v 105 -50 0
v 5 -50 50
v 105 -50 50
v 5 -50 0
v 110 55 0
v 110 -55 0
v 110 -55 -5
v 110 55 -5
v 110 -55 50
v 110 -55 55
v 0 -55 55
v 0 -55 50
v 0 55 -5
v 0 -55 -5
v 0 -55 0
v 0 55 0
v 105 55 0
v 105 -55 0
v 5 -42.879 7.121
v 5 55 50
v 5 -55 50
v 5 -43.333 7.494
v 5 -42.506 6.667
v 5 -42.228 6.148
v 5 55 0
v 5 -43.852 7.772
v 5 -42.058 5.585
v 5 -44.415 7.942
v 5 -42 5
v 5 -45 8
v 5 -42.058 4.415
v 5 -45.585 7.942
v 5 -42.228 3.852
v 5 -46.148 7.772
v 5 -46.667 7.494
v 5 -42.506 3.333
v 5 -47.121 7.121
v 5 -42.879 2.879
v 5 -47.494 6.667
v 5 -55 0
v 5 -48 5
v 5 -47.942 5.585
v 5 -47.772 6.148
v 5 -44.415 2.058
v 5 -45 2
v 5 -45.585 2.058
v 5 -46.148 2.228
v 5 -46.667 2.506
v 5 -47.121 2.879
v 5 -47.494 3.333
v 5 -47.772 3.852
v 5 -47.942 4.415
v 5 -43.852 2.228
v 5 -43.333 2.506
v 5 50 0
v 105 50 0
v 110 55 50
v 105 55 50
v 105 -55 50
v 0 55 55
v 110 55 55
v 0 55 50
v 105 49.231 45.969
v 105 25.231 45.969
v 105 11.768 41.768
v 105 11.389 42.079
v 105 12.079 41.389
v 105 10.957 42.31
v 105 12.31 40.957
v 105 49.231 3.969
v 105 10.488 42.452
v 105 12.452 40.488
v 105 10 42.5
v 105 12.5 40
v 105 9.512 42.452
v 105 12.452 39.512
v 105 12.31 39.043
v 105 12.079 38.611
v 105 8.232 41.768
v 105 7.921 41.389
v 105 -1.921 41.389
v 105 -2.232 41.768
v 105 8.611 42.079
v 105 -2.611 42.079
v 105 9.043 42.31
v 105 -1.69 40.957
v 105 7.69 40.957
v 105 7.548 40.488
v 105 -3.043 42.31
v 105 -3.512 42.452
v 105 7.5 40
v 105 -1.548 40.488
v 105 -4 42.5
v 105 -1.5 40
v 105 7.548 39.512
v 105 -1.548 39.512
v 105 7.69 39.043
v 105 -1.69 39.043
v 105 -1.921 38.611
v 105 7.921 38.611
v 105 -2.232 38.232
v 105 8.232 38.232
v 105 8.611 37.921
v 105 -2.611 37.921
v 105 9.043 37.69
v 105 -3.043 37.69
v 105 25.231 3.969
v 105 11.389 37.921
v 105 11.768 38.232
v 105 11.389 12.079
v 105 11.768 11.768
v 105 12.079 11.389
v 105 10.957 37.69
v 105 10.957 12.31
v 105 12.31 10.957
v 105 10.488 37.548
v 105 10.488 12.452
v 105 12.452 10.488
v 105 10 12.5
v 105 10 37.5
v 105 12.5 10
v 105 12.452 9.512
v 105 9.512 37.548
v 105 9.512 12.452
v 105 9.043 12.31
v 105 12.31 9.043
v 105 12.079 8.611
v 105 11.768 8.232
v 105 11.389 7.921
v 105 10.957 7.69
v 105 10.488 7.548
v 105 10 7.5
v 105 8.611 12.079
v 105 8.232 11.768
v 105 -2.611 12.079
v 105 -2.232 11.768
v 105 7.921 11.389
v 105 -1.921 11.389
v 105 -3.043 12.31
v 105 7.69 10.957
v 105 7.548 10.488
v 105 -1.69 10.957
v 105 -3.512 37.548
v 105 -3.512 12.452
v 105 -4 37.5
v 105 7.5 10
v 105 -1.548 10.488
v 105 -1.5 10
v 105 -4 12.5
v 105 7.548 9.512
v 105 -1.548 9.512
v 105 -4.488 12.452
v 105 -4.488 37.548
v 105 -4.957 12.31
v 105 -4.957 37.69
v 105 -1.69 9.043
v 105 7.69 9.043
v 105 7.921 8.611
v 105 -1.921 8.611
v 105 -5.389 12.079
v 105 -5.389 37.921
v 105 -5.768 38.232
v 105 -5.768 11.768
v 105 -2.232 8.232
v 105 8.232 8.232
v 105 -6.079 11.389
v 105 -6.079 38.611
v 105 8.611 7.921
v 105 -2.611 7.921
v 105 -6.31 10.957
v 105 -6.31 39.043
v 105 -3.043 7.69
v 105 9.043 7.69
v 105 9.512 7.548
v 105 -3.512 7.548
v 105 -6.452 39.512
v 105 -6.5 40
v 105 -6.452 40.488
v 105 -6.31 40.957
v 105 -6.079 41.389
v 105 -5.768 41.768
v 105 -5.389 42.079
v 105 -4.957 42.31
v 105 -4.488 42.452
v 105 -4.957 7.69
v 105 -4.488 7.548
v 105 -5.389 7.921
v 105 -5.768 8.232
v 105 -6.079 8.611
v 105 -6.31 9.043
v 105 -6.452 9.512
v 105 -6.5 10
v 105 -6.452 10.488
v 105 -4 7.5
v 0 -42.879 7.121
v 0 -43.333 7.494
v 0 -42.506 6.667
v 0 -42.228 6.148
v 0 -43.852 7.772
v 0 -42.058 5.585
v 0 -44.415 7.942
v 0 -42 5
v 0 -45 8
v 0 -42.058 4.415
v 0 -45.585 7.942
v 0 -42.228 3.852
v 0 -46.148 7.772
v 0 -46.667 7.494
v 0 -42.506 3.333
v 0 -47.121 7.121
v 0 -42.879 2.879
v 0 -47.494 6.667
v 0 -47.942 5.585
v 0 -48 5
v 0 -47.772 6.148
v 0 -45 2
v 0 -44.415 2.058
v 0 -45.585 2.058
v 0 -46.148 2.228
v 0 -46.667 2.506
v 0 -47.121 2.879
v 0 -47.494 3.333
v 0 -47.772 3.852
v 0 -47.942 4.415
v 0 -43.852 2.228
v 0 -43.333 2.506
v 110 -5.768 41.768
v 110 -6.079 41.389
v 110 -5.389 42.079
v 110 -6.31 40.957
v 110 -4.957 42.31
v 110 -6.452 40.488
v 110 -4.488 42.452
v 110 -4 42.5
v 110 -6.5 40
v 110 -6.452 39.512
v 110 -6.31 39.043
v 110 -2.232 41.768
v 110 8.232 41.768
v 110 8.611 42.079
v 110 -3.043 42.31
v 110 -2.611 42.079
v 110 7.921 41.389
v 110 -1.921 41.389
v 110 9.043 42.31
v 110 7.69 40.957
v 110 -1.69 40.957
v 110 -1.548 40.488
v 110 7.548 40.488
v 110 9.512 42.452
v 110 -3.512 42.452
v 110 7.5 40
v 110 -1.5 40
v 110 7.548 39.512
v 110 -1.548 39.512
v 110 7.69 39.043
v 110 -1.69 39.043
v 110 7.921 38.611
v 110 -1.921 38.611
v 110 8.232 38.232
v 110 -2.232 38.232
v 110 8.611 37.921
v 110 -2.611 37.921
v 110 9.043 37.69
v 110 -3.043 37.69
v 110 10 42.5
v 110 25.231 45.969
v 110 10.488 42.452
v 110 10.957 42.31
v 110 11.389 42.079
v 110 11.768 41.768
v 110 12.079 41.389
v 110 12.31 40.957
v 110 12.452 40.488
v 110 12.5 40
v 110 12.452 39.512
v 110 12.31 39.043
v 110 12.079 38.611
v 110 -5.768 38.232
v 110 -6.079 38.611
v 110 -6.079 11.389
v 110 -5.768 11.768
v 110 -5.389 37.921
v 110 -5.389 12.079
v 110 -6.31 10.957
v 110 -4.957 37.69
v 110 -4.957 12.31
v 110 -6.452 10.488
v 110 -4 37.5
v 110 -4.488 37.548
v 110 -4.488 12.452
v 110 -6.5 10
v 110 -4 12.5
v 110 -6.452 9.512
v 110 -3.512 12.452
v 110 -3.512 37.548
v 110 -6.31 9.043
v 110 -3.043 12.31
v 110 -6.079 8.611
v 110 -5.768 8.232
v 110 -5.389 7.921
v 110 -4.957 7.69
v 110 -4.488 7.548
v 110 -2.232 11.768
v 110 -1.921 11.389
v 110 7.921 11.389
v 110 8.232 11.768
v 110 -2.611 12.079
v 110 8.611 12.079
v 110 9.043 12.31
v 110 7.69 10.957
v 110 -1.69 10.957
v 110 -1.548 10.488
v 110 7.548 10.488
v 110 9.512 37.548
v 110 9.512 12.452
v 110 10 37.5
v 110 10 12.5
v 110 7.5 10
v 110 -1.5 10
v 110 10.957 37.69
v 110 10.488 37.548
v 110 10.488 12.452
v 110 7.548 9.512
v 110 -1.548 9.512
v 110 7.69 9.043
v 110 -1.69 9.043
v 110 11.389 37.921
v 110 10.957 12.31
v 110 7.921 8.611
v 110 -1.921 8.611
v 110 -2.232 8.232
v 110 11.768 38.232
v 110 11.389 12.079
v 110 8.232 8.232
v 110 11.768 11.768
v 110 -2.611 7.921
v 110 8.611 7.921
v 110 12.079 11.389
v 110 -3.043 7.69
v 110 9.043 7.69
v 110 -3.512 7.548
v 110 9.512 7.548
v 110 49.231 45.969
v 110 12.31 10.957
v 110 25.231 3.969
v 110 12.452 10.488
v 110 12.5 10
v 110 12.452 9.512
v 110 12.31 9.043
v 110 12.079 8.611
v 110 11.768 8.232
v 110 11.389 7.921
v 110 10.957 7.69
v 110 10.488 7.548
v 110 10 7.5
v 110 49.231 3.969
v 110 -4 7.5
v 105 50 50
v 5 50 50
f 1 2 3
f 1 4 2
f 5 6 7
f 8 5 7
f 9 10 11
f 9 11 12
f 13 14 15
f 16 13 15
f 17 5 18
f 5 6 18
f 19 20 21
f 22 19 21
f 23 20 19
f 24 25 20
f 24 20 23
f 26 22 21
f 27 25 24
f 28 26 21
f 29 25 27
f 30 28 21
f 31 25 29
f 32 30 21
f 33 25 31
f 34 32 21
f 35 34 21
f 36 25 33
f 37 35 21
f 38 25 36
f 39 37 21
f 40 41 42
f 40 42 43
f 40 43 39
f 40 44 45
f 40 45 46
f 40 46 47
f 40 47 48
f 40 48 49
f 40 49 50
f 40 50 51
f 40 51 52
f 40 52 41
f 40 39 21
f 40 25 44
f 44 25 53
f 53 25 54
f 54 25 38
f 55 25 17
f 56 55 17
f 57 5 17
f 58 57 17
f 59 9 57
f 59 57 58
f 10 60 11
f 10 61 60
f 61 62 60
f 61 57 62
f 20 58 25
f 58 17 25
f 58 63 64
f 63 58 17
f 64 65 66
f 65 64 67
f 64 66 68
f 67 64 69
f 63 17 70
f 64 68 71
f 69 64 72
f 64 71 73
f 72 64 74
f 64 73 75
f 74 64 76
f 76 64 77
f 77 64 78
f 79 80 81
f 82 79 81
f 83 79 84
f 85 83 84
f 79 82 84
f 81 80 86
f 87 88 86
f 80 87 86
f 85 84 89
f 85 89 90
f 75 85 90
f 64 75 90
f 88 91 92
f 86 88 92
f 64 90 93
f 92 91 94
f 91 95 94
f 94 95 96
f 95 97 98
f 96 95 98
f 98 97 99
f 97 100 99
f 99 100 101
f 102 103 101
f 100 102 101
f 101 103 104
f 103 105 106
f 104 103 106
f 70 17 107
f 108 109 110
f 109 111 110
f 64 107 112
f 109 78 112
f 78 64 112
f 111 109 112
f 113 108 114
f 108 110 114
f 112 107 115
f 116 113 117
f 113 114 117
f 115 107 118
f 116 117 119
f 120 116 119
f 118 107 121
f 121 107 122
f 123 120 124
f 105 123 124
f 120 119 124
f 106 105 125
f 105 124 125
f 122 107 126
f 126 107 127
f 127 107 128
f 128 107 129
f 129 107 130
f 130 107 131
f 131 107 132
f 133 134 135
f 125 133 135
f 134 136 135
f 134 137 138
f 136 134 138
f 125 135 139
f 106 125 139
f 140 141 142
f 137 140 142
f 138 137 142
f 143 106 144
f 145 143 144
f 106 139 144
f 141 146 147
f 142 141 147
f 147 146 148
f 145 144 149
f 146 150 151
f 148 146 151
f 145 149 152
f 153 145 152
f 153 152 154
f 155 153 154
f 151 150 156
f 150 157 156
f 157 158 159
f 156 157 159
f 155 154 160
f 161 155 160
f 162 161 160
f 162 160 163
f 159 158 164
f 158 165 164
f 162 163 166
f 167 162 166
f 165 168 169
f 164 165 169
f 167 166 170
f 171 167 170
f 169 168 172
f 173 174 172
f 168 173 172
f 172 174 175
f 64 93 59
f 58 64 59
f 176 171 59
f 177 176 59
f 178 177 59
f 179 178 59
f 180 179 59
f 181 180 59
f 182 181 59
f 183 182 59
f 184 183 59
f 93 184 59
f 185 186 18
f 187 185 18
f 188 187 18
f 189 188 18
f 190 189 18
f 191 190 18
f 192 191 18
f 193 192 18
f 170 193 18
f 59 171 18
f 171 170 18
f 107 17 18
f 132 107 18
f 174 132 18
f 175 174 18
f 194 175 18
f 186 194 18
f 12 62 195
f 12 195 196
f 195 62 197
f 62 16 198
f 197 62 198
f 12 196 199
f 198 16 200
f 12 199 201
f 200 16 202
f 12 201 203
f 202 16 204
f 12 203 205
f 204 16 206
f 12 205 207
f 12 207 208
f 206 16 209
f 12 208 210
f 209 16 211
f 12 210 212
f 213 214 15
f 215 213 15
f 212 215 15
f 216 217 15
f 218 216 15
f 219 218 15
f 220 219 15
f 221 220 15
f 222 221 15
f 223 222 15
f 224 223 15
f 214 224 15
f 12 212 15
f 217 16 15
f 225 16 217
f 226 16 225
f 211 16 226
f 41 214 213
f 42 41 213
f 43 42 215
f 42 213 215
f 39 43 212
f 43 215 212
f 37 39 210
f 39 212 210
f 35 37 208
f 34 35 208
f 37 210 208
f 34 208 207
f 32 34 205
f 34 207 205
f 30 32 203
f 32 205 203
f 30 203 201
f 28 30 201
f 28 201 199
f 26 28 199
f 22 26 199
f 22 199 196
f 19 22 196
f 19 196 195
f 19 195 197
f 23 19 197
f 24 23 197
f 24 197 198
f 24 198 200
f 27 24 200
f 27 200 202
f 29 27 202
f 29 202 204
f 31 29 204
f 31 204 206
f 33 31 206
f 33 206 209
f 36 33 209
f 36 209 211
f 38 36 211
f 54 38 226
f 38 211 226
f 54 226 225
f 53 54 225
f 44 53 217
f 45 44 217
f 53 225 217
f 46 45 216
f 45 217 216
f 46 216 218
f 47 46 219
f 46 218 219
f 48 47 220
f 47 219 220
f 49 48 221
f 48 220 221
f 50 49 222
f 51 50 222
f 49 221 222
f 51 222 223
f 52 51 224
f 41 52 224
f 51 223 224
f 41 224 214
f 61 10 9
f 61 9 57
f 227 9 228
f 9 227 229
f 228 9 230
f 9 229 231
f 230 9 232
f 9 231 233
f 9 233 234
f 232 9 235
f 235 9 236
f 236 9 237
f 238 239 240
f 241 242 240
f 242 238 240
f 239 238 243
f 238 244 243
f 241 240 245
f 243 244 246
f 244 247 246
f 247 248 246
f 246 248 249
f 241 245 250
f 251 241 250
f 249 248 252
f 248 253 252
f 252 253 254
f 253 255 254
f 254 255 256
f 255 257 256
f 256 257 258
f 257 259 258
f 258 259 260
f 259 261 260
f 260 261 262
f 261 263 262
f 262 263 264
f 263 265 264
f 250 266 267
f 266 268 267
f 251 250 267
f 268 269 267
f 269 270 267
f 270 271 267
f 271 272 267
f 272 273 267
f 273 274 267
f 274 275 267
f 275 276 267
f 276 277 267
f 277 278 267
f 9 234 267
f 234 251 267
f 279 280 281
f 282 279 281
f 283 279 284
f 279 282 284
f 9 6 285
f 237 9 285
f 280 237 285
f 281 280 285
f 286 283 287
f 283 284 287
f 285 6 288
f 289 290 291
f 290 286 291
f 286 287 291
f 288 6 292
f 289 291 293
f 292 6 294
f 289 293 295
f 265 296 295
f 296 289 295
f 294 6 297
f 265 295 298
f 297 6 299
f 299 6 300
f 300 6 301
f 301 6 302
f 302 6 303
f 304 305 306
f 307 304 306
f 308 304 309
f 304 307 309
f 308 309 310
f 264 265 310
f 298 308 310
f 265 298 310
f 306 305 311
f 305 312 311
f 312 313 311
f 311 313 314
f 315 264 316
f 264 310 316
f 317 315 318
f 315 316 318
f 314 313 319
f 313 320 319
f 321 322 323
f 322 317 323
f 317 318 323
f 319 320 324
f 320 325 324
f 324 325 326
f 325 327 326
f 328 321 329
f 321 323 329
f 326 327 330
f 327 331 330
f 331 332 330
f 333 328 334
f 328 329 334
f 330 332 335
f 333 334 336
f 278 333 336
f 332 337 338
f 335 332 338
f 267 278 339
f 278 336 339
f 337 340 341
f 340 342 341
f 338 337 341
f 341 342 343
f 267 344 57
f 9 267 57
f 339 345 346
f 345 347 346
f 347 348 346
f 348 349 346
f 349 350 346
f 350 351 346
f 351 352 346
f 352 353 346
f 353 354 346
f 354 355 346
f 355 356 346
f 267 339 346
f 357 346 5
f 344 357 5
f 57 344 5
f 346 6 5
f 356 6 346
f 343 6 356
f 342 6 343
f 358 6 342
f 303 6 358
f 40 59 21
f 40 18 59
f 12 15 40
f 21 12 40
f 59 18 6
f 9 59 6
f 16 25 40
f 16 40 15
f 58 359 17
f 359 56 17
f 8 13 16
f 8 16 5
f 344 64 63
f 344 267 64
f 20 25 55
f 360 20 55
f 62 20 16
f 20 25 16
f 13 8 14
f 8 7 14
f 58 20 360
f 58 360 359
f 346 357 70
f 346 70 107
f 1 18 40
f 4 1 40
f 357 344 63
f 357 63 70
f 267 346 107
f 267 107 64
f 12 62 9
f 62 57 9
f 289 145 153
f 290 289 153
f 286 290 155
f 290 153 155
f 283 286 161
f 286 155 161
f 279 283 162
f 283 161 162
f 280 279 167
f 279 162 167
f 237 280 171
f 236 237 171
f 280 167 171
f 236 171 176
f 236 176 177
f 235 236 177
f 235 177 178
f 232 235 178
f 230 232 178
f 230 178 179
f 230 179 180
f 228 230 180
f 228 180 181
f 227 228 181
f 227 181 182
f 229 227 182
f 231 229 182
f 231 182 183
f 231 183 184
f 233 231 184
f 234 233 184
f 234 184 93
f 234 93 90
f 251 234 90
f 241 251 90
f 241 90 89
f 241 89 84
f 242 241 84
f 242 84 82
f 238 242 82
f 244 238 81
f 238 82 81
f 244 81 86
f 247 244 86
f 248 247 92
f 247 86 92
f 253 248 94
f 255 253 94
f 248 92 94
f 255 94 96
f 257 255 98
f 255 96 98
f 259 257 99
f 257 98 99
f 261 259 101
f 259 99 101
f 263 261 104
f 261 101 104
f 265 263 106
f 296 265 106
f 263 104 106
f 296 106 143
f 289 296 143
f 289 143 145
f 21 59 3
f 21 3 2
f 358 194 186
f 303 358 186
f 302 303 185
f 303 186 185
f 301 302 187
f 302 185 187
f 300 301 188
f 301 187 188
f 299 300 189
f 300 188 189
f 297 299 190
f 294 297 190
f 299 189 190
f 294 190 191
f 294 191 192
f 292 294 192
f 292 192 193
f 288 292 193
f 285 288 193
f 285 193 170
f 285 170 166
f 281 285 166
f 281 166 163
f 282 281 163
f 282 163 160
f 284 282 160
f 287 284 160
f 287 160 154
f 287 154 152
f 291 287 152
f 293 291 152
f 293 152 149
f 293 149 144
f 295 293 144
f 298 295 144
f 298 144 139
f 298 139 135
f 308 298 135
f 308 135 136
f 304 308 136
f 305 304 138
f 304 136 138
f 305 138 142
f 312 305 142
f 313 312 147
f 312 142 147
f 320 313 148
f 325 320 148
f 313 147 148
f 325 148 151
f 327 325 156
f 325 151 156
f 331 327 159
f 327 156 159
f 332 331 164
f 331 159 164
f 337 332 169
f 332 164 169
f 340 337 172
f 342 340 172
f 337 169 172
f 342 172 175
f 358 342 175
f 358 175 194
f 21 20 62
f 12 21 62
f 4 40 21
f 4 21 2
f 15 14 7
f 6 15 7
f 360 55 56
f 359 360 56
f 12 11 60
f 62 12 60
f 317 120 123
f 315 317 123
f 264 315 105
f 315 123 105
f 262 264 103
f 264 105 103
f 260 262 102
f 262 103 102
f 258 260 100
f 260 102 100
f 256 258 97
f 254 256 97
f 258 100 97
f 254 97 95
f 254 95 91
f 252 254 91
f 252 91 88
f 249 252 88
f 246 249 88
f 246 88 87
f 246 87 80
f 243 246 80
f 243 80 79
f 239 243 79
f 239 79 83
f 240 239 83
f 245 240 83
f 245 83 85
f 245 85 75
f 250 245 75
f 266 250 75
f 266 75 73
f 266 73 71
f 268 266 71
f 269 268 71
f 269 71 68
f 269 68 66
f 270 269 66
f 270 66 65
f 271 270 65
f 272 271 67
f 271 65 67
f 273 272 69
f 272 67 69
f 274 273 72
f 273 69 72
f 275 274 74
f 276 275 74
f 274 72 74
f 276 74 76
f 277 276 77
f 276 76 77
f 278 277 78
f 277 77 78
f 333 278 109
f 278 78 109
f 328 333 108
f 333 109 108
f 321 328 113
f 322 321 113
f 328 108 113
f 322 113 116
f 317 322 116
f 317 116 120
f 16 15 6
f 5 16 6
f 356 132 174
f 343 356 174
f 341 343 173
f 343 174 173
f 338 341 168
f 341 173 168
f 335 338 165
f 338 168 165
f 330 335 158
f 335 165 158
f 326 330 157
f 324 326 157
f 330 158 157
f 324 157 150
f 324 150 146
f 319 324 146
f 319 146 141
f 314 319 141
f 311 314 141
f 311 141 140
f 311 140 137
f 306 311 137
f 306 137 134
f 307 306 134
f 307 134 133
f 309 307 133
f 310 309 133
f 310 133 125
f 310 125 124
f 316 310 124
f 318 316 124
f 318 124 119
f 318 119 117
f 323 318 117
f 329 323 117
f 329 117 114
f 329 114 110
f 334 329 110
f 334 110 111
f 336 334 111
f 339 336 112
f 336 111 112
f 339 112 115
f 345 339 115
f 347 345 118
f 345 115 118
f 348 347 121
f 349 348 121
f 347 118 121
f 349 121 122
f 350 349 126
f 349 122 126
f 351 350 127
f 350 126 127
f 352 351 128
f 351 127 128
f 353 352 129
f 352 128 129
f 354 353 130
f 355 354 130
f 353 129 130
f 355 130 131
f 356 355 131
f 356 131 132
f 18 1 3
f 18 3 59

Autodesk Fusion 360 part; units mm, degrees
sketch "Sketch1" plane through (0, 0, 0) normal (0, 1, 0) x (1, 0, 0)
  line L0 (0, 0) -> (110, 0)
  line L1 (110, 0) -> (110, 5)
  line L2 (110, 5) -> (0, 5)
  line L3 (0, 5) -> (0, 0)
  dimension "d1" = 110
extrude "Extrude1" add sketch "Sketch1" along normal mid plane 110 makes body 1
sketch "Sketch2" plane through (0, 0, 0) normal (0, 0, 1) x (-1, 0, 0)
  line L0 (-110, 55) -> (-110, -55)
  line L1 (-110, -55) -> (0, -55)
  line L2 (0, -55) -> (0, 55)
  line L3 (0, 55) -> (-110, 55)
  line L4 (0, -55) -> (-5.0003, -55)
  line L5 (-5.0003, -55) -> (-5.0003, 55)
  line L6 (-5.0003, 55) -> (0, 55)
  line L7 (0, 55) -> (0, -55)
extrude "Extrude2" add sketch "Sketch2" along normal blind 50 separate body contours L1 L2 L3 L4 L5 L6 L7 makes body 2
sketch "Sketch3" plane through (0, 0, 0) normal (0, 0, 1) x (1, 0, 0)
sketch "Sketch4" plane through (0, 0, 0) normal (0, 0, 1) x (-1, 0, 0)
  line L0 (-110, 55) -> (-110, -55)
  line L1 (-110, -55) -> (0, -55)
  line L2 (0, -55) -> (0, 55)
  line L3 (0, 55) -> (-110, 55)
  line L4 (-110, -55) -> (-105, -55)
  line L5 (-105, -55) -> (-105, 55)
  line L6 (-105, 55) -> (-110, 55)
  line L7 (-110, 55) -> (-110, -55)
  dimension "d6" = 5
  dimension "d7" = 110
extrude "Extrude3" add sketch "Sketch4" along normal blind 50 separate body contours L0 L1 L3 L4 L5 L6 L7 makes body 3
sketch "Sketch5" plane through (0, 0, 0) normal (0, 0, 1) x (-1, 0, 0)
  line L0 (-110, 55) -> (-110, -55)
  line L1 (-110, -55) -> (0, -55)
  line L2 (0, -55) -> (0, 55)
  line L3 (0, 55) -> (-110, 55)
sketch "Sketch6" plane through (0, 0, 0) normal (0, 0, 1) x (-1, 0, 0)
  line L0 (-105, 55) -> (-5, 55)
  line L1 (-5, 55) -> (-5, 50)
  line L2 (-5, 50) -> (-105, 50)
  line L3 (-105, 50) -> (-105, 55)
extrude "Extrude4" add sketch "Sketch6" along normal blind 50 separate body makes body 4
sketch "Sketch7" plane through (0, 0, 0) normal (0, 0, 1) x (1, 0, 0)
  line L0 (105, 55) -> (5, 55)
  line L1 (5, 55) -> (5, 50)
  line L2 (5, 50) -> (105, 50)
  line L3 (105, 50) -> (105, 55)
extrude "Extrude5" add sketch "Sketch7" along normal blind 50 separate body makes body 5
sketch "Sketch8" plane through (110, 0, 0) normal (1, 0, 0) x (0, 1, 0)
  line L0 (-55, 0) -> (55, 0)
  line L1 (55, 0) -> (55, 50)
  line L2 (55, 50) -> (-55, 50)
  line L3 (-55, 50) -> (-55, 0)
  line L4 (-55, 50) -> (55, 50)
  line L5 (55, 50) -> (55, 55)
  line L6 (55, 55) -> (-55, 55)
  line L7 (-55, 55) -> (-55, 50)
extrude "Extrude6" add sketch "Sketch8" against normal blind 110 separate body contours L2 L4 L5 L6 L7 makes body 6
sketch "Sketch9" plane through (110, 0, 0) normal (1, 0, 0) x (0, 1, 0)
  line L0 (-55, 0) -> (55, 0)
  line L1 (55, 0) -> (55, 50)
  line L2 (55, 50) -> (-55, 50)
  line L3 (-55, 50) -> (-55, 0)
  line L4 (49.2314, 3.9692) -> (25.2314, 3.9692)
  line L5 (25.2314, 3.9692) -> (25.2314, 45.9692)
  line L6 (25.2314, 45.9692) -> (49.2314, 45.9692)
  line L7 (49.2314, 45.9692) -> (49.2314, 3.9692)
  dimension "d16" = 24
  dimension "d17" = 42
extrude "Extrude7" cut sketch "Sketch9" against normal blind 15 contours L4 L5 L6 L7 bodies 3
sketch "Sketch10" plane through (110, 0, 0) normal (1, 0, 0) x (0, 1, 0)
  line L0 (25.2314, 3.9692) -> (25.2314, 45.9692)
  line L1 (25.2314, 45.9692) -> (49.2314, 45.9692)
  line L2 (49.2314, 45.9692) -> (49.2314, 3.9692)
  line L3 (49.2314, 3.9692) -> (25.2314, 3.9692)
  line L4 (-55, 0) -> (55, 0)
  line L5 (55, 0) -> (55, 50)
  line L6 (55, 50) -> (-55, 50)
  line L7 (-55, 50) -> (-55, 0)
  line L8 (10, 0) -> (10, 50)
  line L9 (10, 50) -> (10, 40)
  line L10 (10, 0) -> (10, 10)
  circle A0 centre (10, 10) radius 2.5
  circle A1 centre (10, 40) radius 2.5
  dimension "d20" = 5
  dimension "d21" = 5
hole "Hole1" at (110, 10, 40) direction (-1, 0, 0) diameter 5 depth 5 tip angle 118 bodies 3
hole "Hole2" at (110, 10, 10) direction (-1, 0, 0) diameter 5 depth 5 tip angle 118 bodies 3
sketch "Sketch11" plane through (110, 0, 0) normal (1, 0, 0) x (0, 1, 0)
  line L0 (10, 10) -> (-4, 10)
  line L1 (-4, 10) -> (-4, 40)
  line L2 (-4, 40) -> (10, 40)
hole "Hole3" at (110, -4, 40) direction (-1, 0, 0) diameter 5 depth 5 tip angle 118 bodies 3
hole "Hole4" at (110, -4, 10) direction (-1, 0, 0) diameter 5 depth 5 tip angle 118 bodies 3
sketch "Sketch12" plane through (0, 0, 0) normal (-1, 0, 0) x (0, -1, 0)
  line L0 (-55, 0) -> (55, 0)
  line L1 (55, 0) -> (55, 50)
  line L2 (55, 50) -> (-55, 50)
  line L3 (-55, 50) -> (-55, 0)
  circle A0 centre (45, 5) radius 3
  dimension "d34" = 6
extrude "Extrude8" cut sketch "Sketch12" against normal blind 20 contours A0 bodies 2
copy_body "Body->Comp1" bodies 2 removing the originals makes body 7 in component "Component"
copy_body "Body->Comp2" bodies 6 removing the originals makes body 8 in component "Component'"
copy_body "Body->Comp3" bodies 5 removing the originals makes body 9 in component "Component''"
copy_body "Body->Comp4" bodies 4 removing the originals makes body 10 in component "Component'''"
copy_body "Body->Comp5" bodies 3 removing the originals makes body 11 in component "Component''''"
copy_body "Body->Comp6" bodies 1 removing the originals makes body 12 in component "Component'''''"
component "Component" placed x (1, 0, 0) y (0, 1, 0) z (0, 0, 1) at (0, 0, 0)
component "Component'" placed x (1, 0, 0) y (0, 1, 0) z (0, 0, 1) at (0, 0, 0)
component "Component''" placed x (1, 0, 0) y (0, 1, 0) z (0, 0, 1) at (0, 0, 0)
component "Component'''" placed x (1, 0, 0) y (0, 1, 0) z (0, 0, 1) at (0, 0, 0)
component "Component''''" placed x (1, 0, 0) y (0, 1, 0) z (0, 0, 1) at (0, 0, 0)
component "Component'''''" placed x (1, 0, 0) y (0, 1, 0) z (0, 0, 1) at (0, 0, 0)
